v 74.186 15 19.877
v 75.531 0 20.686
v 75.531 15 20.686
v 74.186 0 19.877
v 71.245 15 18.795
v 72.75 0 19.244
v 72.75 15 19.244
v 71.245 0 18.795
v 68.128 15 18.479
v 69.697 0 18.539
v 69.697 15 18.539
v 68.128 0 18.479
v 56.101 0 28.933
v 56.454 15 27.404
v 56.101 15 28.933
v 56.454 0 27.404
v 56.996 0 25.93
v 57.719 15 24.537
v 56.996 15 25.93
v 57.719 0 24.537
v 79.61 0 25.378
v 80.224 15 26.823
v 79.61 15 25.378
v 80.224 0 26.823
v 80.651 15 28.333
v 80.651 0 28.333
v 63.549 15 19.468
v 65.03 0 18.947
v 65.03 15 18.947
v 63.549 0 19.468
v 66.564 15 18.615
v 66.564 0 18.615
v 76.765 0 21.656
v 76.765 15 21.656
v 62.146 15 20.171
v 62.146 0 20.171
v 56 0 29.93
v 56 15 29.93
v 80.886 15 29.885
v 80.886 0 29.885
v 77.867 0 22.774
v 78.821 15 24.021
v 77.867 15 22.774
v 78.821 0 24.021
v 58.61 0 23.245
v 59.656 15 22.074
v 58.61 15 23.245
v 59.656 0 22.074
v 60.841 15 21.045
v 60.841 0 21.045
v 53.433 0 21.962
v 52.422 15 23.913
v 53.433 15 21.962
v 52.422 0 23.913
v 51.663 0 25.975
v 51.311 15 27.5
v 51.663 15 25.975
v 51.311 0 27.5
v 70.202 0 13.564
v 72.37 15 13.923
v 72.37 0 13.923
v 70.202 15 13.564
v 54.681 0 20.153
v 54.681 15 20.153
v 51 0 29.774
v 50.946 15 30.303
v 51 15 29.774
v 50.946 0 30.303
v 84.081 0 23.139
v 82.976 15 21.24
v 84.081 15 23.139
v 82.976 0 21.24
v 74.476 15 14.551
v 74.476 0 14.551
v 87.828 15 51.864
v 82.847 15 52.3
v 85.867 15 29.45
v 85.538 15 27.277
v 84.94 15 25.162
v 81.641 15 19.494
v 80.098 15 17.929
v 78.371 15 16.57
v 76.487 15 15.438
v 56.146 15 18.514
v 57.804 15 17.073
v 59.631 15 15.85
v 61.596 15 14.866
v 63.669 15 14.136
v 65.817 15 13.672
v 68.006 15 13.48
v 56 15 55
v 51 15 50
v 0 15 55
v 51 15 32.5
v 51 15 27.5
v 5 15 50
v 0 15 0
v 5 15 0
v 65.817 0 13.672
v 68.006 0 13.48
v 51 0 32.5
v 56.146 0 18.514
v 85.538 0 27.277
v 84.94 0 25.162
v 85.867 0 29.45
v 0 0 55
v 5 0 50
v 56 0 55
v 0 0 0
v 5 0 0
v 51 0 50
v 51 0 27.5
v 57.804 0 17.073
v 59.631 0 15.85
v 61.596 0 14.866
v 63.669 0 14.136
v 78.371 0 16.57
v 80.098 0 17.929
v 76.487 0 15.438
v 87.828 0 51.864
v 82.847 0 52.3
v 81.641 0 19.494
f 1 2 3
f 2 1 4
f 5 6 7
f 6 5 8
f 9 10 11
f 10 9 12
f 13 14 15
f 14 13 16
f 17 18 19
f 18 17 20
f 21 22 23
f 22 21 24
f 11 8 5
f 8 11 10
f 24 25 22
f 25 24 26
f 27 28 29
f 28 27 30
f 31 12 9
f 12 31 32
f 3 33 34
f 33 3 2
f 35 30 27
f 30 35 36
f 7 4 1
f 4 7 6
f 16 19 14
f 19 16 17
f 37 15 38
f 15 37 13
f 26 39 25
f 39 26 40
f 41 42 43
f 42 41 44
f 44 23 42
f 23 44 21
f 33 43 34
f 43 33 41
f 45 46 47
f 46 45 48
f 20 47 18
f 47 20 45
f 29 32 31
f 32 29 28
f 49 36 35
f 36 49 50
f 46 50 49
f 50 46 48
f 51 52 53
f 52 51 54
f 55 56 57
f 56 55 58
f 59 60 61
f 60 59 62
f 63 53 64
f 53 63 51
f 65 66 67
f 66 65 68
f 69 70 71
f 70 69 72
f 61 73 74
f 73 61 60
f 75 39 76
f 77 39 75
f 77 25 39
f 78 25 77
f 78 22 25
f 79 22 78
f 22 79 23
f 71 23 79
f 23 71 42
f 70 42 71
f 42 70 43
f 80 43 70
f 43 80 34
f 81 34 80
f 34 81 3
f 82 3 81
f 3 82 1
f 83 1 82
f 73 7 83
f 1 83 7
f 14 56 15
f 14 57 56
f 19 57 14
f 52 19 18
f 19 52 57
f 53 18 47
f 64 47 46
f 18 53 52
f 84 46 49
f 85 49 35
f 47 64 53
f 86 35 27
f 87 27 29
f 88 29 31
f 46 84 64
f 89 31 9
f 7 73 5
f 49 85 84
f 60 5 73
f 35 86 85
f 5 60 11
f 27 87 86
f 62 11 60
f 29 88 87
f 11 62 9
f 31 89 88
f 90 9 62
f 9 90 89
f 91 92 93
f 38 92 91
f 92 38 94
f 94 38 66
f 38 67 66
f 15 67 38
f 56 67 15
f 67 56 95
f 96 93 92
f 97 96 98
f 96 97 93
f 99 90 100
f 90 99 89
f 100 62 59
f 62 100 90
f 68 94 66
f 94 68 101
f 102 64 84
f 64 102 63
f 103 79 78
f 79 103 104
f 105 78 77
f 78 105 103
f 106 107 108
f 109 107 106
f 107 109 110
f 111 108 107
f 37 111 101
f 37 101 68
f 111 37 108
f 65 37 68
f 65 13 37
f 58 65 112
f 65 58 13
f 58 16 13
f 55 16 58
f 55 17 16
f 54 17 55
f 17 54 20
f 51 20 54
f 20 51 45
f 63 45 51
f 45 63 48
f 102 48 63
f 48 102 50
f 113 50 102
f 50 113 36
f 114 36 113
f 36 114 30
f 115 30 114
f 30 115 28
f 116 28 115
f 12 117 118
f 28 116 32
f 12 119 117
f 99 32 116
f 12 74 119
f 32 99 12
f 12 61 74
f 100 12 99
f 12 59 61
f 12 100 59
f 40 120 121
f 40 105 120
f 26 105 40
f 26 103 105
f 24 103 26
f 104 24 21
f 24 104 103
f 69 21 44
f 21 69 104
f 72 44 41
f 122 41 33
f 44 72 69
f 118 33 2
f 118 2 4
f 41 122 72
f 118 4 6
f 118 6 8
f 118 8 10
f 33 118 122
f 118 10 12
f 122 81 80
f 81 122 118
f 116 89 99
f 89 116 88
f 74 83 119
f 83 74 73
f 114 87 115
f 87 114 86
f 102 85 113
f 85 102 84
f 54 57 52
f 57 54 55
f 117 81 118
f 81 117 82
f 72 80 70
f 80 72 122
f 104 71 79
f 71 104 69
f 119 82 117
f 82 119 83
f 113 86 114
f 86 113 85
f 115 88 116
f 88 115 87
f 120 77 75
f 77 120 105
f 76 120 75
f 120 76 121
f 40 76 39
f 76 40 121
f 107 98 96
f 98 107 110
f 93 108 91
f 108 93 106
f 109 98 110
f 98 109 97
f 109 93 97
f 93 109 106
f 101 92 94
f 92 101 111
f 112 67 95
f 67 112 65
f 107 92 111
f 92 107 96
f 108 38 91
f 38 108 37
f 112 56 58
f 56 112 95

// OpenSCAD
$fn=50;
BackLength=55;//Back Depth
HBWidth=46;//Frame Width
HoseDiameter=25;//Hanger Diameter
FrontLength=35;//Front Height
Width=15;//Hanger Width
HangerThickenss=5;//Thickness


translate([0,0,0])cube([HangerThickenss,Width,BackLength]);
translate([HangerThickenss,0,BackLength-HangerThickenss])cube([HBWidth,Width,HangerThickenss]);
translate([HBWidth+HangerThickenss,0,BackLength-FrontLength+HoseDiameter/2-HangerThickenss])cube([HangerThickenss,Width,FrontLength-HoseDiameter/2+HangerThickenss]);
translate([HBWidth+HangerThickenss,0,BackLength-FrontLength+HoseDiameter/2])rotate([0,5,0])hanger();

module hanger(){
    difference(){
        translate([HoseDiameter/2+HangerThickenss,Width/2,0])rotate([90,0,0])cylinder(d=HoseDiameter+HangerThickenss*2,h=Width,center=true);
        union(){
            translate([HoseDiameter/2+HangerThickenss,Width/2,0])rotate([90,0,0])cylinder(d=HoseDiameter,h=Width+2,center=true);
            translate([0,-1,0])cube([HoseDiameter+HangerThickenss*2,Width+2,HoseDiameter]);
        }
    }
    translate([HoseDiameter+HangerThickenss,0,0])cube([HangerThickenss,Width,FrontLength-HoseDiameter/2]);
}
